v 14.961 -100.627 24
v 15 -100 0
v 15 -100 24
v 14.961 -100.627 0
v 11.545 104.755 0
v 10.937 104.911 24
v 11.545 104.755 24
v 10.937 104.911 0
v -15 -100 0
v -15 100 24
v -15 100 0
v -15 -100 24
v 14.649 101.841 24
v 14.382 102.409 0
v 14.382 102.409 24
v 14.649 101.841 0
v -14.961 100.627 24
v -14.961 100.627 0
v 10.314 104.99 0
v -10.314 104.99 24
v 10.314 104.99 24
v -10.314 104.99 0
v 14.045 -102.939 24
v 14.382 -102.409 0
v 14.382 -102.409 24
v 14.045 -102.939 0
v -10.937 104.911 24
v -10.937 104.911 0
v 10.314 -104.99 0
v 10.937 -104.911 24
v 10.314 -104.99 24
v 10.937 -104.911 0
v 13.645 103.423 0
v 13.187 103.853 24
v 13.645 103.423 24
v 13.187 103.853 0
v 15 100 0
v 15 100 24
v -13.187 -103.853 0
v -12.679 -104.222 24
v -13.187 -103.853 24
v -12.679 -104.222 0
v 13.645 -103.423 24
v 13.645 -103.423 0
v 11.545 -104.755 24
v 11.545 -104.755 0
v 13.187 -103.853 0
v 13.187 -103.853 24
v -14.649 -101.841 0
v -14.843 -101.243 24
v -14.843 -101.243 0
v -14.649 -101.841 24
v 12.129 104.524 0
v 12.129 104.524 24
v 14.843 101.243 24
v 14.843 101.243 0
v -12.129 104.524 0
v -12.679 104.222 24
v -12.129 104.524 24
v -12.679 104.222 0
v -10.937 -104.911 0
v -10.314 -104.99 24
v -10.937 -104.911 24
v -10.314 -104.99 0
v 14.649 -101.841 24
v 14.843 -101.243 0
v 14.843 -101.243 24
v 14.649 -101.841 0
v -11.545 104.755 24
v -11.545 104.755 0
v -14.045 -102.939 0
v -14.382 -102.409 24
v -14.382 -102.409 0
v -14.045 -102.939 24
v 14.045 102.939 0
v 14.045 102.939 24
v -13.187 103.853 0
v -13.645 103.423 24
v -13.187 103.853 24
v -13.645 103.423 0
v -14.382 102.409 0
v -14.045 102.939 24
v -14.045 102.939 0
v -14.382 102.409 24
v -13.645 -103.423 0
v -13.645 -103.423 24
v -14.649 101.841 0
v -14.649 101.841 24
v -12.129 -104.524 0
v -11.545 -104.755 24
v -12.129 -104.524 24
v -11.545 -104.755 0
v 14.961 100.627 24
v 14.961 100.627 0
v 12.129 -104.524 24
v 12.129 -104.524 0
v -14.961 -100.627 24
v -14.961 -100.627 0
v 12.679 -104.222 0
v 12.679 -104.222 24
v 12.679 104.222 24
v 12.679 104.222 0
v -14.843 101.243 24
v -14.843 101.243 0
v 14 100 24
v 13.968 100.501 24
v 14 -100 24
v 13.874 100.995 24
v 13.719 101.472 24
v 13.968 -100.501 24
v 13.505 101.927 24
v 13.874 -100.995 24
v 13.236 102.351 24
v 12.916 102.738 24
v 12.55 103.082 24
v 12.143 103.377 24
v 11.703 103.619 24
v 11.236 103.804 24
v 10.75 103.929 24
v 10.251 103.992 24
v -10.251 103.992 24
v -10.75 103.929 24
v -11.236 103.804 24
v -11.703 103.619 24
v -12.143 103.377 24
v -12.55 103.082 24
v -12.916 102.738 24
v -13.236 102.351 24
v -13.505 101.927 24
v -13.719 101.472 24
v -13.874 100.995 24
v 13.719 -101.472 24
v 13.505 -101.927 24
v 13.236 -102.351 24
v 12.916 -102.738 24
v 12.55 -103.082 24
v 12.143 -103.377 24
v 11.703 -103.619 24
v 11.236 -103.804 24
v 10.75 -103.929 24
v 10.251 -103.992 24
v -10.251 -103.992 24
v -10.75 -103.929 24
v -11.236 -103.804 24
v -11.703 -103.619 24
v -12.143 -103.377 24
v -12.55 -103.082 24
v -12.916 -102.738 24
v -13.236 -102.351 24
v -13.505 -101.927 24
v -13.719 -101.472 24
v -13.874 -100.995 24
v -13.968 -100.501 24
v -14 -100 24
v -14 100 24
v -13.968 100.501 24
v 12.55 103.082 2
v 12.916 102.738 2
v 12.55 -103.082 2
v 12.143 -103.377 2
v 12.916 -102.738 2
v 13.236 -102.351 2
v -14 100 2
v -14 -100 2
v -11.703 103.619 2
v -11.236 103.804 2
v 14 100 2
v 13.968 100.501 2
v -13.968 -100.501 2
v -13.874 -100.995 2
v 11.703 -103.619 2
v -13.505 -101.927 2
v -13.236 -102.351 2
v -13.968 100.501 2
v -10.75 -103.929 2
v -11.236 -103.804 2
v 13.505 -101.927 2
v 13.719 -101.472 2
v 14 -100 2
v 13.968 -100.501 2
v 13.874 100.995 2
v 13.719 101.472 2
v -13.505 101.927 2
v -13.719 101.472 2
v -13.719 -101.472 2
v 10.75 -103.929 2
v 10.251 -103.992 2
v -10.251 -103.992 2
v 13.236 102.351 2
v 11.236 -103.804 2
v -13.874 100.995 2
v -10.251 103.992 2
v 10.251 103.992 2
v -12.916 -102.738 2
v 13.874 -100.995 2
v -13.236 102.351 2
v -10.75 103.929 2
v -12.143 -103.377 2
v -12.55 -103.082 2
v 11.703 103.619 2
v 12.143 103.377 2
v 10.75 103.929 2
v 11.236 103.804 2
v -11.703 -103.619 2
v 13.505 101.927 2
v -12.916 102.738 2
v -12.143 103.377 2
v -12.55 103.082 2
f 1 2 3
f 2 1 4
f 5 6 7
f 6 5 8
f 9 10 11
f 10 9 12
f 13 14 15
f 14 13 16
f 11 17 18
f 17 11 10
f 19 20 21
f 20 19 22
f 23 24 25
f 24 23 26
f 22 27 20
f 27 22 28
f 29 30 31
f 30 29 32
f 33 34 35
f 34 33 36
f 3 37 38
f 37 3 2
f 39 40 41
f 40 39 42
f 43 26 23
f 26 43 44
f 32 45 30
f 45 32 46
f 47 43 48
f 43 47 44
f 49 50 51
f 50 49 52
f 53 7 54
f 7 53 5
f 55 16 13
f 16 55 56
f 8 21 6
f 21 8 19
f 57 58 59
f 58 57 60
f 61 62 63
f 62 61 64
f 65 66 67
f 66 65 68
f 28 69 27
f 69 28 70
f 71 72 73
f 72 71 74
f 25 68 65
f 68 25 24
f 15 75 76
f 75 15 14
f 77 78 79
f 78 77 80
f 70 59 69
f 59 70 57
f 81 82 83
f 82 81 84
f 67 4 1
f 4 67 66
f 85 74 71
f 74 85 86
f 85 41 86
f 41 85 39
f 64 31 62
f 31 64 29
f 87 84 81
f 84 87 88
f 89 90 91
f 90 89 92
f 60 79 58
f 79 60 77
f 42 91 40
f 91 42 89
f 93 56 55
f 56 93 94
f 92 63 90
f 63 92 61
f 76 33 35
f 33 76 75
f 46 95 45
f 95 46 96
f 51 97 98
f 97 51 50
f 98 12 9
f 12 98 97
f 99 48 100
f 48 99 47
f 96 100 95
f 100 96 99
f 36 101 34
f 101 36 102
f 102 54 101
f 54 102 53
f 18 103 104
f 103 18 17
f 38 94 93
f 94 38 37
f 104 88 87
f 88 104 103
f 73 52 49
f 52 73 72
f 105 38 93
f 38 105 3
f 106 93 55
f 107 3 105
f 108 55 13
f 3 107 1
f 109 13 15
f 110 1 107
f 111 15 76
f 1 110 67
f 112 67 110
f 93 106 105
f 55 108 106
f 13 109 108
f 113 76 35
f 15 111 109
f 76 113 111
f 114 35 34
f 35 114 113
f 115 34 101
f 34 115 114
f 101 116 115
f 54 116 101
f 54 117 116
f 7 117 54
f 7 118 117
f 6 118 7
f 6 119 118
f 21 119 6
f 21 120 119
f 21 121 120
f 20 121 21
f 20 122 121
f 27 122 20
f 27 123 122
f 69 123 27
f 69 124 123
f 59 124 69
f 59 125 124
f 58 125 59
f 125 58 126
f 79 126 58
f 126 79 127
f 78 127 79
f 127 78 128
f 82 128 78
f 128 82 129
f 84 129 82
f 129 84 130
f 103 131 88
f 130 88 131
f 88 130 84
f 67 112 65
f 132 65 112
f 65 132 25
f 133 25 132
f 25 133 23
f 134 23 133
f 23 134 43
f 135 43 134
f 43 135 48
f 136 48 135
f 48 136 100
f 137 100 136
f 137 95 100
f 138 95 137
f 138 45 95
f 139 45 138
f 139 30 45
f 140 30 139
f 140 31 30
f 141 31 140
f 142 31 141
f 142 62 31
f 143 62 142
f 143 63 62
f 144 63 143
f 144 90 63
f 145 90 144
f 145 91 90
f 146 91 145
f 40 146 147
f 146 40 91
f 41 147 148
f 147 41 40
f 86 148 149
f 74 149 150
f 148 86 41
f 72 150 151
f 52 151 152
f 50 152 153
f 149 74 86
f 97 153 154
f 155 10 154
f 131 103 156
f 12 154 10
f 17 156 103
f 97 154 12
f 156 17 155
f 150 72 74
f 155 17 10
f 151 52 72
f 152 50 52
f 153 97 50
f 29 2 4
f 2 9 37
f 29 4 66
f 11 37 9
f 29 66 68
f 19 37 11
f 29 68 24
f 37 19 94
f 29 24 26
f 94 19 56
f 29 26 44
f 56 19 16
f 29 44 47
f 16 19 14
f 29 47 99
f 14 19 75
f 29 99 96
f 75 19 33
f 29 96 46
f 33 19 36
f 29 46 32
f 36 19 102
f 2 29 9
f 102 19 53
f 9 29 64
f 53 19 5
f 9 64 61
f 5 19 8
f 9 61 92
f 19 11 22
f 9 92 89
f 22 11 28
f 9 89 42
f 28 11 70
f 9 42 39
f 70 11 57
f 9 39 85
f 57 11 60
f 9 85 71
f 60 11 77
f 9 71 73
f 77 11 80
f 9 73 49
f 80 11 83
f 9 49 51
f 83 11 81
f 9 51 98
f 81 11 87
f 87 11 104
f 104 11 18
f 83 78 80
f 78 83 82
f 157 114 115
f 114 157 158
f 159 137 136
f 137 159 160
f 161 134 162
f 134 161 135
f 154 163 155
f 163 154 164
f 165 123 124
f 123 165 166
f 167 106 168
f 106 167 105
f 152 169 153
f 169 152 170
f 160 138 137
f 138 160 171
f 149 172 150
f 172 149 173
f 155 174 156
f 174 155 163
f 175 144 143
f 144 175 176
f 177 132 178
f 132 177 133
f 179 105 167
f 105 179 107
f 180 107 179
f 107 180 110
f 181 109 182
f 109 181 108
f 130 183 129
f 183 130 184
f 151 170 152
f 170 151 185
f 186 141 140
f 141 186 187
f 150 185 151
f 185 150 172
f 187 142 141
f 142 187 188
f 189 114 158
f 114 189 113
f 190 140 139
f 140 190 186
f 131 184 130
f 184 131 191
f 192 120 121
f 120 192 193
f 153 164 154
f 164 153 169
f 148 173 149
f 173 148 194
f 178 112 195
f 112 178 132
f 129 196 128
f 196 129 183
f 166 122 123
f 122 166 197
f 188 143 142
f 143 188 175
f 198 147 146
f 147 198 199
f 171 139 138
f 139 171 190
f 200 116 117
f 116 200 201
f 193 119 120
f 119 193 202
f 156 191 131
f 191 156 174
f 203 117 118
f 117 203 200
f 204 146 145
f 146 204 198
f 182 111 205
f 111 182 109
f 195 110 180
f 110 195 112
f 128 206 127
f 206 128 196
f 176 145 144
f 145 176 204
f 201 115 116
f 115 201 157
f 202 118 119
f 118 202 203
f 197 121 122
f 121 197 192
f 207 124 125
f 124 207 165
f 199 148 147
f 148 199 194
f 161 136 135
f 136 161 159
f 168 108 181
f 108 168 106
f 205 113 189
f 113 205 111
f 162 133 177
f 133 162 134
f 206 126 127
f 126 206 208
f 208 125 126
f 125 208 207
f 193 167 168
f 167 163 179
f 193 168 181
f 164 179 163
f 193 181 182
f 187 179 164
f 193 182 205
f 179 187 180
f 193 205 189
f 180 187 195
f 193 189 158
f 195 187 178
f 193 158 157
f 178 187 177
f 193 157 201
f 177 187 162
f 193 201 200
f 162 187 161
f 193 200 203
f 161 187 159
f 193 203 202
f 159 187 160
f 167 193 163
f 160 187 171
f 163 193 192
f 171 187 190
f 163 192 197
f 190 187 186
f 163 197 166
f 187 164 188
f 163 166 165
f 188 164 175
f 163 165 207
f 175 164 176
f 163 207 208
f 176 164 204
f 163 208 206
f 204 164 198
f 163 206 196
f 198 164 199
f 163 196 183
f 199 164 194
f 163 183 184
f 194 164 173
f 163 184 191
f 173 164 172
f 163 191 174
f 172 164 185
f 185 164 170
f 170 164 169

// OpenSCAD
$fn = 50;


difference() {
	union() {
		hull() {
			translate(v = [-10.0000000000, 100.0000000000, 0]) {
				cylinder(h = 24, r = 5);
			}
			translate(v = [10.0000000000, 100.0000000000, 0]) {
				cylinder(h = 24, r = 5);
			}
			translate(v = [-10.0000000000, -100.0000000000, 0]) {
				cylinder(h = 24, r = 5);
			}
			translate(v = [10.0000000000, -100.0000000000, 0]) {
				cylinder(h = 24, r = 5);
			}
		}
	}
	union() {
		translate(v = [0, 0, 2]) {
			hull() {
				translate(v = [-10.0000000000, 100.0000000000, 0]) {
					cylinder(h = 22, r = 4);
				}
				translate(v = [10.0000000000, 100.0000000000, 0]) {
					cylinder(h = 22, r = 4);
				}
				translate(v = [-10.0000000000, -100.0000000000, 0]) {
					cylinder(h = 22, r = 4);
				}
				translate(v = [10.0000000000, -100.0000000000, 0]) {
					cylinder(h = 22, r = 4);
				}
			}
		}
	}
}
